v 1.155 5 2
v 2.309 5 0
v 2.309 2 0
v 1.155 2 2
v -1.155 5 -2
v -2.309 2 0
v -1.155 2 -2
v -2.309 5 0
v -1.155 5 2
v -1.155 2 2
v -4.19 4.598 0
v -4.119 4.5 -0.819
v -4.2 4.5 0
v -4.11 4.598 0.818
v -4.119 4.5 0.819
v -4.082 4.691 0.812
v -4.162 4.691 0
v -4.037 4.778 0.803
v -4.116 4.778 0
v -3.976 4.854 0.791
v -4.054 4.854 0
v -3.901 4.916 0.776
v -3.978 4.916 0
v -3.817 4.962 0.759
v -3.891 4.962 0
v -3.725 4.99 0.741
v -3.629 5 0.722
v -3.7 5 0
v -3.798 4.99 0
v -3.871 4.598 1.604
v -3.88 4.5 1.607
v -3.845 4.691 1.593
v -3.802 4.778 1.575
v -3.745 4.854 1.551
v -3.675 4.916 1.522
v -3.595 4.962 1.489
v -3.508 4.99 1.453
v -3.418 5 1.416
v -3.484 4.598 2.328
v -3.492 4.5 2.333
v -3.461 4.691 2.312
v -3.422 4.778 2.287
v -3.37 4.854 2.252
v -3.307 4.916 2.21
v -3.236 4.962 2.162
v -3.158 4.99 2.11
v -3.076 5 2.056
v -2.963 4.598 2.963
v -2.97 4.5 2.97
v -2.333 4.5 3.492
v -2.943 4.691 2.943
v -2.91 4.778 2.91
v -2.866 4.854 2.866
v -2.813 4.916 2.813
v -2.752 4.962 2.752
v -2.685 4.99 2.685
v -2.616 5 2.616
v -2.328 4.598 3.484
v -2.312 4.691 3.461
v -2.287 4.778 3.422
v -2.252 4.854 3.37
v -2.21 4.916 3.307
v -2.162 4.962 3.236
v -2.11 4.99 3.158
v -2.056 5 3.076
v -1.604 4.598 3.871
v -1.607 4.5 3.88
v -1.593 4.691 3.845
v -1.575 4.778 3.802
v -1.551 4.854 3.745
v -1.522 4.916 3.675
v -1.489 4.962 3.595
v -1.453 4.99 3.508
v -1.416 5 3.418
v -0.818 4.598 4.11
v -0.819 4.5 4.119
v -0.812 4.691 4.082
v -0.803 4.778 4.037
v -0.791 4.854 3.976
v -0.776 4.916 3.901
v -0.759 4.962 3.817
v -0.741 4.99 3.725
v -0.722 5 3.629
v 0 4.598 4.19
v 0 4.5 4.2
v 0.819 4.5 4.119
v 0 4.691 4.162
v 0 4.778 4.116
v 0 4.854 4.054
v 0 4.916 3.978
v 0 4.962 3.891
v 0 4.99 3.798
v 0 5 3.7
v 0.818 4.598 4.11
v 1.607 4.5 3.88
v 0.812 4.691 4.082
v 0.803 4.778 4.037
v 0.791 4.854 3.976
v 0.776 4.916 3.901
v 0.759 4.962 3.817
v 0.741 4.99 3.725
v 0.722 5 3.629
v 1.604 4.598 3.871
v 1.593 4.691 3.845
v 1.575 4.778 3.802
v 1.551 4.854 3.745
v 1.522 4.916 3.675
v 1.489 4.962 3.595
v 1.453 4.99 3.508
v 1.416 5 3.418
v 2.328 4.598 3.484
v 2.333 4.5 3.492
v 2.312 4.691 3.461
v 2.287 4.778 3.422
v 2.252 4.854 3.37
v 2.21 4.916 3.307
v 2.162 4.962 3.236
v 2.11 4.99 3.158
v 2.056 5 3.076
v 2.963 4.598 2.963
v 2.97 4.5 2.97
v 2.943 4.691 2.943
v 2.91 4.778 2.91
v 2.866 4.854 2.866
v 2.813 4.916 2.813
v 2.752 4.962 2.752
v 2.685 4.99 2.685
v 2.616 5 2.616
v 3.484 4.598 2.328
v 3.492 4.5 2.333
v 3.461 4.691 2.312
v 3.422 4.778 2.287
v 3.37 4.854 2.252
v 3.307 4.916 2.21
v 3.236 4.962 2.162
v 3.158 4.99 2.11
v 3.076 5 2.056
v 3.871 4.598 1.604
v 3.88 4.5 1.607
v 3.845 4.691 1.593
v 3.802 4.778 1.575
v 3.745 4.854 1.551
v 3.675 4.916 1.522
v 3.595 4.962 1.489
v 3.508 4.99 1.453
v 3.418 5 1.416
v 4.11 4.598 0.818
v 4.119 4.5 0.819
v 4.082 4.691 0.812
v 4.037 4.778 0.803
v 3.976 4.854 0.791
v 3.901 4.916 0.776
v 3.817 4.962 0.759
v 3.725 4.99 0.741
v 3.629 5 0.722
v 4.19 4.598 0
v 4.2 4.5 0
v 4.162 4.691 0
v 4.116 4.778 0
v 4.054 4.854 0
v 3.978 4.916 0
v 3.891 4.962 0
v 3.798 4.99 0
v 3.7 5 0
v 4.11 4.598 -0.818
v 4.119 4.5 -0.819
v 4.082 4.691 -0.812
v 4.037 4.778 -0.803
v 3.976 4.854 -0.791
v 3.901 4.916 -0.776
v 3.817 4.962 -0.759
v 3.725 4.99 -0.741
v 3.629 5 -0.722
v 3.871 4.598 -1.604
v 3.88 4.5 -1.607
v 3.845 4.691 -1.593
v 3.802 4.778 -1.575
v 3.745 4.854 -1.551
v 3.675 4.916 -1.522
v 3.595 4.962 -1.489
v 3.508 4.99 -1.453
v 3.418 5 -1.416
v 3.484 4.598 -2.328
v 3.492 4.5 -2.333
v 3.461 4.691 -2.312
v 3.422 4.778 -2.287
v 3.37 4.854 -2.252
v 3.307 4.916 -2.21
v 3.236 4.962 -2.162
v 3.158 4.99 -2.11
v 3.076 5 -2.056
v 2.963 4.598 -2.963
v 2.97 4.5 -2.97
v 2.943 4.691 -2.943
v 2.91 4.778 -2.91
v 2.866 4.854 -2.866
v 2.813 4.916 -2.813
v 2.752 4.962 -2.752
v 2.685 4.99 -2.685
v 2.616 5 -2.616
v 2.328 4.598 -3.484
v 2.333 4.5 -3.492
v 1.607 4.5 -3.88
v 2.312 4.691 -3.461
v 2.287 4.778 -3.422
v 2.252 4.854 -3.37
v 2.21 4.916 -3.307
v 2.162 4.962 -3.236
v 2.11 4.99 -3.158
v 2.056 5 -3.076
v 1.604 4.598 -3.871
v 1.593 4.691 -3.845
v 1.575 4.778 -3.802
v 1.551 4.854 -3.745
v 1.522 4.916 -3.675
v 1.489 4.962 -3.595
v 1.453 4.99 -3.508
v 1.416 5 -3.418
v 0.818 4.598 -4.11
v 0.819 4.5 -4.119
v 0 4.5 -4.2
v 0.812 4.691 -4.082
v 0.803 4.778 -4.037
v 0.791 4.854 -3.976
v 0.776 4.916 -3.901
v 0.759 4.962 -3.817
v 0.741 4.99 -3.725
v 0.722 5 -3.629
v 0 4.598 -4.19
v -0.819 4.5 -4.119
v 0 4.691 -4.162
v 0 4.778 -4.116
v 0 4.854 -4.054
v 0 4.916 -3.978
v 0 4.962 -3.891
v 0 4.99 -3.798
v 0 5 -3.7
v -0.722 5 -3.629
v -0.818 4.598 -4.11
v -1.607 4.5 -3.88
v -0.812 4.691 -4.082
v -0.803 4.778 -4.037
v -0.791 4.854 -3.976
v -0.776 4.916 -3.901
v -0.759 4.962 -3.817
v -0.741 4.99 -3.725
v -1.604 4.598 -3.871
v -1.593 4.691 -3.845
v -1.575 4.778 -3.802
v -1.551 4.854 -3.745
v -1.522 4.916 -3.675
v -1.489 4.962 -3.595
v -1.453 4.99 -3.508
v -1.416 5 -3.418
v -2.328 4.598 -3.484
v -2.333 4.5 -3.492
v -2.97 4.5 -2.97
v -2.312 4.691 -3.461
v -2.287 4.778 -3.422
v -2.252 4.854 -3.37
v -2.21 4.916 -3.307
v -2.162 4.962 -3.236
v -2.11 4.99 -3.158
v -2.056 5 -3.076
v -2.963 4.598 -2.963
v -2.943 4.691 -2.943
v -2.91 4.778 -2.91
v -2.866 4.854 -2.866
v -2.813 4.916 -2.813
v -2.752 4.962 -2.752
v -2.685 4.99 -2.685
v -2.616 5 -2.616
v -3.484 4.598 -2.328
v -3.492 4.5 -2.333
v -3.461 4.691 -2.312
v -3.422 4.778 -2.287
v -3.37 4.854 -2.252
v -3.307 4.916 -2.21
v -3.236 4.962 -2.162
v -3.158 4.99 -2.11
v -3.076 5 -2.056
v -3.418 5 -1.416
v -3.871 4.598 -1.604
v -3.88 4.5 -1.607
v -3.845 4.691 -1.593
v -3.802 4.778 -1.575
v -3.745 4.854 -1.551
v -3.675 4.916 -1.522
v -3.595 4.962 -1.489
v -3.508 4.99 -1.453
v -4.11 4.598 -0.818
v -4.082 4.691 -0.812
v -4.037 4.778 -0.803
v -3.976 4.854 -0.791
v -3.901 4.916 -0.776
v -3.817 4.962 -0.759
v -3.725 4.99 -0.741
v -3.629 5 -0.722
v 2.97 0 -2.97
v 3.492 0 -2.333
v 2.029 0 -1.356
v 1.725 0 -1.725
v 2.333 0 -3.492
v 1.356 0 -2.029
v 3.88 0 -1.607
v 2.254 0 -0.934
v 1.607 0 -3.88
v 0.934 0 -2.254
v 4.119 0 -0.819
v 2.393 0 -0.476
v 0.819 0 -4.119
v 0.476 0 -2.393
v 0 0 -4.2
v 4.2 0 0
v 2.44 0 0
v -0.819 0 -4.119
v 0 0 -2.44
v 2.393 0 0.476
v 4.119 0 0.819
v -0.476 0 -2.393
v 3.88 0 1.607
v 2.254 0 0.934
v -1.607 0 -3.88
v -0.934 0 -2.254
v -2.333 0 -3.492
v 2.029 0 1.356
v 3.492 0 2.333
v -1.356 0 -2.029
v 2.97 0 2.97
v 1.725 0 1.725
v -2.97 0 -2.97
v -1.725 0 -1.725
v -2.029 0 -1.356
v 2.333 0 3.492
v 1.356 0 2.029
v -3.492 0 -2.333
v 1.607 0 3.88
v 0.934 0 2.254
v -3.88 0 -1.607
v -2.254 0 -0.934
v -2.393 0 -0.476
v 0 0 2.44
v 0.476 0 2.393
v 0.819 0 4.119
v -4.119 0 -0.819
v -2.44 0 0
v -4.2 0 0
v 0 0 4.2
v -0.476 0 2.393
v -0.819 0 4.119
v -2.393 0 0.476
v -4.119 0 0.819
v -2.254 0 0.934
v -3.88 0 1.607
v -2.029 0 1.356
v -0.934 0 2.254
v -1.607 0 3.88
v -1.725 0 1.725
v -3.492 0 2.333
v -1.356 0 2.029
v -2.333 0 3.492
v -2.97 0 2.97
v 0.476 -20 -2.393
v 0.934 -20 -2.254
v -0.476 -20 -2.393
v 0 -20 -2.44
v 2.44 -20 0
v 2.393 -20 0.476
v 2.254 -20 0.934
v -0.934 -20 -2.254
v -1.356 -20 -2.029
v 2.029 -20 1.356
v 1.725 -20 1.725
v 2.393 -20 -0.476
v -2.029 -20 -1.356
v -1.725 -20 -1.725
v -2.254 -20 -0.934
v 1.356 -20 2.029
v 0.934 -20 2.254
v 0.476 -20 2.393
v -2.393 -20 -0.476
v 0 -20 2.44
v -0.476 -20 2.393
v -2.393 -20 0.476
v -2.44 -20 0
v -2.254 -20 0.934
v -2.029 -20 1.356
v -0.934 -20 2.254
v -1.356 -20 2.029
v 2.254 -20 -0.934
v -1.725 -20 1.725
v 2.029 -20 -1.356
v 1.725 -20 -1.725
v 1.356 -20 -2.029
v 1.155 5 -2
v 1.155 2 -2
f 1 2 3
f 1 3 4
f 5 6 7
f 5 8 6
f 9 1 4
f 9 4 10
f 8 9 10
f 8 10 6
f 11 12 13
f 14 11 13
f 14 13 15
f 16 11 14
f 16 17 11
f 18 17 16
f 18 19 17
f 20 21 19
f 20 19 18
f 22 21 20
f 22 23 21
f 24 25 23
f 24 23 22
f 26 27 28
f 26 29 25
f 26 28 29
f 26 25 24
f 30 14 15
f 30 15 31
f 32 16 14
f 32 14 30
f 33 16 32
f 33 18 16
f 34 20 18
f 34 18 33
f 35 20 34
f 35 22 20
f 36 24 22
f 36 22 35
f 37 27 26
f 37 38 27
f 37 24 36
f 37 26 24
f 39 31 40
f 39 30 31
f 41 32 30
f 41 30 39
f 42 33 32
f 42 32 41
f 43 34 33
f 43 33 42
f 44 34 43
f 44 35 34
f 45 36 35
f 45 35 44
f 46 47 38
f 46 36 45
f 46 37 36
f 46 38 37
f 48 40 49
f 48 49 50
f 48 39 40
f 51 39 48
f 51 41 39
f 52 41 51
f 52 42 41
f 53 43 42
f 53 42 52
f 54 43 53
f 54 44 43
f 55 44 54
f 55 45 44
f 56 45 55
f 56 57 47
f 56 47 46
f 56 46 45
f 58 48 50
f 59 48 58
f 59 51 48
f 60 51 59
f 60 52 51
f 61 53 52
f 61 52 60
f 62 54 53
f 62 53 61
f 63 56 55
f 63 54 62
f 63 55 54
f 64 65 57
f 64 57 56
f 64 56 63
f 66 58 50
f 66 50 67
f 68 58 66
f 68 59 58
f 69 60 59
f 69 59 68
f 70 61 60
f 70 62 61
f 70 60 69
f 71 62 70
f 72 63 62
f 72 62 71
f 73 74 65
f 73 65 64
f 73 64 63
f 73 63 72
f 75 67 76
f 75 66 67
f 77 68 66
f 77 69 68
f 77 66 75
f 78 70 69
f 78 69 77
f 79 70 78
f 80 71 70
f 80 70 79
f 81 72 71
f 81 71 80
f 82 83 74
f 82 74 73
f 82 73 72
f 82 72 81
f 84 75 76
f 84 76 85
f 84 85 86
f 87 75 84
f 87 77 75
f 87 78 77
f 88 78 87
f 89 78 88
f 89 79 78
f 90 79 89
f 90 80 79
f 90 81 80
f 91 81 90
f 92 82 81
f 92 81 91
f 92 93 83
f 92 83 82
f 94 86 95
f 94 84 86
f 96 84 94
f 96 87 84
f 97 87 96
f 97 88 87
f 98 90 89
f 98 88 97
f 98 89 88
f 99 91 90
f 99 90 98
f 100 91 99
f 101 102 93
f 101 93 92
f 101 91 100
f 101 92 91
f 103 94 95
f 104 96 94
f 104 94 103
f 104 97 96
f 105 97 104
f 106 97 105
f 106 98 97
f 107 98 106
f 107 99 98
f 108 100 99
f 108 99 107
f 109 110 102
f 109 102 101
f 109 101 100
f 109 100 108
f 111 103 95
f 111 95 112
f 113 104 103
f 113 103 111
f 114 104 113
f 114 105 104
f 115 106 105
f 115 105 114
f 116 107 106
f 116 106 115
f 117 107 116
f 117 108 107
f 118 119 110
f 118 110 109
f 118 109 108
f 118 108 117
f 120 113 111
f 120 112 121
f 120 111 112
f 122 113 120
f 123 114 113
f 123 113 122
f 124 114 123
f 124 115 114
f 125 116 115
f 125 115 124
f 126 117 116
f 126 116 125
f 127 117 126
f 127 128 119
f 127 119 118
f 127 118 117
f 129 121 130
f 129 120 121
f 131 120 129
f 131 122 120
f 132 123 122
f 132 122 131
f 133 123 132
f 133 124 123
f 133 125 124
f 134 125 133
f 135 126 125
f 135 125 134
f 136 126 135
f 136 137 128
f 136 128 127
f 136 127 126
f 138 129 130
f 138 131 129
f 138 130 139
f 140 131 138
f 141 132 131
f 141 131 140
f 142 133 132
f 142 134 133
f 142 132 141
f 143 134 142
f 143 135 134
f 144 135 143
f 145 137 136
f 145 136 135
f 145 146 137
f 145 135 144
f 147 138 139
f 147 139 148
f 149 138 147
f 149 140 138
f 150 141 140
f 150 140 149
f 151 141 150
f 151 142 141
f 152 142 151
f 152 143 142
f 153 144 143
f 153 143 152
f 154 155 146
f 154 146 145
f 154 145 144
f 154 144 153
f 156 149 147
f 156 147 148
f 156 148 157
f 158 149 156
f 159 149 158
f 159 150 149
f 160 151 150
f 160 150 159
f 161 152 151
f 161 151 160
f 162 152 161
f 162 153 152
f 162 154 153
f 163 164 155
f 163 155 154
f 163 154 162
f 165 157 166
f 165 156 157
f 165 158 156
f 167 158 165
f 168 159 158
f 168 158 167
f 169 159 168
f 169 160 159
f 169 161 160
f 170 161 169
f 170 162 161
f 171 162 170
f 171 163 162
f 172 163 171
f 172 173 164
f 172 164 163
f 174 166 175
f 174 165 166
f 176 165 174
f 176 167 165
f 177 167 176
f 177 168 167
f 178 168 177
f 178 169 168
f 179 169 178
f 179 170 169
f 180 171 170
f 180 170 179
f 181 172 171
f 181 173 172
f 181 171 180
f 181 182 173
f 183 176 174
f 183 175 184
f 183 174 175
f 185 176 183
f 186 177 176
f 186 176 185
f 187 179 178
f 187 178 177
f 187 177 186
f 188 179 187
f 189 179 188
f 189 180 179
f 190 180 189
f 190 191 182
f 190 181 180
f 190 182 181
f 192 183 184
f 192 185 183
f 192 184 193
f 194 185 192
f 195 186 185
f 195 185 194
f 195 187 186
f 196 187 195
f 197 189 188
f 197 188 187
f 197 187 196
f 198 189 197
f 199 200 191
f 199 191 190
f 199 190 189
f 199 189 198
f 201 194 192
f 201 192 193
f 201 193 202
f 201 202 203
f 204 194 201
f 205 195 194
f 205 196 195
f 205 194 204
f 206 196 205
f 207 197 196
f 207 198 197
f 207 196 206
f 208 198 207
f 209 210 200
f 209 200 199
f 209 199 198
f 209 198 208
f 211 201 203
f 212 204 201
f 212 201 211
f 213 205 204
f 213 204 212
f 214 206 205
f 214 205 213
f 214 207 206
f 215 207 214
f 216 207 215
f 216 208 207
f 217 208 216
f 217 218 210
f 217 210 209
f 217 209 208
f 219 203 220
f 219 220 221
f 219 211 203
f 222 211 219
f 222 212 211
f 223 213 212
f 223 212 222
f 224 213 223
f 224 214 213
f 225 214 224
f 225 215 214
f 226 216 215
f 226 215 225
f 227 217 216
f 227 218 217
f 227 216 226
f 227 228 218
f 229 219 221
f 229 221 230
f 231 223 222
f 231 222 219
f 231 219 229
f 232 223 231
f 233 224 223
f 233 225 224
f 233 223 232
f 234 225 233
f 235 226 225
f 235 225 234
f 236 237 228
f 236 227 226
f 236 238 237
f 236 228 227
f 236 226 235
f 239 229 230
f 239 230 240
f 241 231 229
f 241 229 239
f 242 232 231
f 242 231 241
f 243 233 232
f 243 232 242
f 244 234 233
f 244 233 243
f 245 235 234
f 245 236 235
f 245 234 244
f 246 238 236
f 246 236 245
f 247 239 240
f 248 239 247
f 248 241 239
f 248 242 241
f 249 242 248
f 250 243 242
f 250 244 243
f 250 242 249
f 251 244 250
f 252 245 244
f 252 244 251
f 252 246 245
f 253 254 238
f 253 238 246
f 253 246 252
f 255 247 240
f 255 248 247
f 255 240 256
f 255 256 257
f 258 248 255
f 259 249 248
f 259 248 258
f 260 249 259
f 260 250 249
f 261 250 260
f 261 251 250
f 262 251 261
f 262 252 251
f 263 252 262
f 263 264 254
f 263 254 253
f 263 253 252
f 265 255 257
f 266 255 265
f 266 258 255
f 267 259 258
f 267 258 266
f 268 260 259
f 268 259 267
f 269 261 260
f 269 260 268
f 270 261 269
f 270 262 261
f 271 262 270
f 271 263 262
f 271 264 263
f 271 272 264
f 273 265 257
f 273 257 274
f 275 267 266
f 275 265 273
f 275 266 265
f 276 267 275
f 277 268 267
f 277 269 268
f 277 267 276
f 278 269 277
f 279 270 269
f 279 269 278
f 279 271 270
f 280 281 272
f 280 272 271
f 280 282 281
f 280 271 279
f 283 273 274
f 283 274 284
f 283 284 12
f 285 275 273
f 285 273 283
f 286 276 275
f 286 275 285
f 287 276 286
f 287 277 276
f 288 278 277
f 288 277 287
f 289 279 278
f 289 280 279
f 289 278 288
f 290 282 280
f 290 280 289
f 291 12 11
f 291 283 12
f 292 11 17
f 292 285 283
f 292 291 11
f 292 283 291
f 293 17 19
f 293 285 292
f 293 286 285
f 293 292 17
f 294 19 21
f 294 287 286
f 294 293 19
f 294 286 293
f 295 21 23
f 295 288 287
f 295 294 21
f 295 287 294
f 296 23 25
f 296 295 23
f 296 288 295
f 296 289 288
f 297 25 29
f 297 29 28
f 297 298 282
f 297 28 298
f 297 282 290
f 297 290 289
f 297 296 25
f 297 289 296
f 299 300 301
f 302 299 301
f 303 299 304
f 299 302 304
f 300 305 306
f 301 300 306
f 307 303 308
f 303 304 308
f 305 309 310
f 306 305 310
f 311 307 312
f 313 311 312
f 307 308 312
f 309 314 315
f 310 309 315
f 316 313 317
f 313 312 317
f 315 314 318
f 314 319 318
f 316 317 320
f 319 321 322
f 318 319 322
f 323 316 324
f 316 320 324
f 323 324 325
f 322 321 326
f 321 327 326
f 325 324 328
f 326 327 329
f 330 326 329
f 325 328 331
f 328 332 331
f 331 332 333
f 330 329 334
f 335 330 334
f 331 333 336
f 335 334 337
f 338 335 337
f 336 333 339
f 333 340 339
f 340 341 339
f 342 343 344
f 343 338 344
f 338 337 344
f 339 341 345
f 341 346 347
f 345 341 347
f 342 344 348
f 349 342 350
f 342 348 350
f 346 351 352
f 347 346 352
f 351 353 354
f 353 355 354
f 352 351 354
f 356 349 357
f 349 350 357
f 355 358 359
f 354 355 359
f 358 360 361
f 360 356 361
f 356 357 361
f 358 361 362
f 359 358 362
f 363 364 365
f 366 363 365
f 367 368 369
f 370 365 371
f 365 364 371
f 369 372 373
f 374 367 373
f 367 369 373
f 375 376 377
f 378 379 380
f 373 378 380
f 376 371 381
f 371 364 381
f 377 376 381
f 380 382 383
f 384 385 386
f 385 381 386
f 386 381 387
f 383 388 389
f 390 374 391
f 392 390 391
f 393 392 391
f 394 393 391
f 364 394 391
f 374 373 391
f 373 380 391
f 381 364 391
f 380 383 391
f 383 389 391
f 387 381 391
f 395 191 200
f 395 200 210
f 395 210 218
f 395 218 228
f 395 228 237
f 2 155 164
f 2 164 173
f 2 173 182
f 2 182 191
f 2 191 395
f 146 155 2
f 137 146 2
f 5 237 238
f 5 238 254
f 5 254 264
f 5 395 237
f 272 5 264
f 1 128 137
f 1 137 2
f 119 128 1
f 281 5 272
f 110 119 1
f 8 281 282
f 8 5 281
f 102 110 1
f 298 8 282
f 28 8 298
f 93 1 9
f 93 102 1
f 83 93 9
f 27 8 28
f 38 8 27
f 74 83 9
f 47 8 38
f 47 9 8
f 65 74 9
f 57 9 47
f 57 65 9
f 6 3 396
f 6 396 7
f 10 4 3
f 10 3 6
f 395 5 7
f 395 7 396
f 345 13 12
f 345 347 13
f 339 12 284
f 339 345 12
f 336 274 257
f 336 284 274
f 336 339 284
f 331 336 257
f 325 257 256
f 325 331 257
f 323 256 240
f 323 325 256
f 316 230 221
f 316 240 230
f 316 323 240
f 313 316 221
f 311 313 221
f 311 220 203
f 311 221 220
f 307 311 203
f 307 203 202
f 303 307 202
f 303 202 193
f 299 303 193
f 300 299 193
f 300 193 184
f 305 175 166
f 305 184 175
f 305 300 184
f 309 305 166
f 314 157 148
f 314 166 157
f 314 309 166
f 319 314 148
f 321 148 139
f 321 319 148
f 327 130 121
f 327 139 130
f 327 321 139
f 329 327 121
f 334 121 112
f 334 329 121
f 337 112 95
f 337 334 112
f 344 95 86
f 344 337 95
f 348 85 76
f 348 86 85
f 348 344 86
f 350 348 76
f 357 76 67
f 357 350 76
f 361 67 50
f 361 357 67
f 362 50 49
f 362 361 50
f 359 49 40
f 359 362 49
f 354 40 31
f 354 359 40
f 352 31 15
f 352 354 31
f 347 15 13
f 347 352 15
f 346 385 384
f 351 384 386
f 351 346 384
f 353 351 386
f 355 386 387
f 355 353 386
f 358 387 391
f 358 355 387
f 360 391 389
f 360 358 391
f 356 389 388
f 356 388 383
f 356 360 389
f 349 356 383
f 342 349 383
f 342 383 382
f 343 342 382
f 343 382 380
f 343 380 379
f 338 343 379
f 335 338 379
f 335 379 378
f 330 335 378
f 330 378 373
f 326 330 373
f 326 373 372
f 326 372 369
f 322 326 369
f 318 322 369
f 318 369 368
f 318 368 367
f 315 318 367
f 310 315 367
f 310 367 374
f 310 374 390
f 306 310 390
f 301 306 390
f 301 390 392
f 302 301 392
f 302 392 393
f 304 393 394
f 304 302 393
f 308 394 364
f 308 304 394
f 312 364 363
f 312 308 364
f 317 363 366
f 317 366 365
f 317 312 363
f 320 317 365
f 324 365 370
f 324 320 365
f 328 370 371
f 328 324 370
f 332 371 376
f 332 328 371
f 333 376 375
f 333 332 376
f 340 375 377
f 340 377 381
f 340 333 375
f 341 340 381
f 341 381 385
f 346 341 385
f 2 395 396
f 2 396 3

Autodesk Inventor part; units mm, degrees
ref_plane "YZ Plane" through (0, 0, 0) normal (1, 0, 0) x (0, 1, 0)
ref_plane "XZ Plane" through (0, 0, 0) normal (0, 1, 0) x (-1, 0, 0)
ref_plane "XY Plane" through (0, 0, 0) normal (0, 0, 1) x (1, 0, 0)
sketch "Sketch1" plane through (0, 0, 0) normal (0, 1, 0) x (-1, 0, 0)
  circle A0 centre (0, 0) radius 2.44
  circle A1 centre (0, 0) radius 4.2
  line L0 (1.1547, -2) -> (-1.1547, -2)
  line L1 (-1.1547, -2) -> (-2.3094, 0)
  line L2 (-2.3094, 0) -> (-1.1547, 2)
  line L3 (-1.1547, 2) -> (1.1547, 2)
  line L4 (1.1547, 2) -> (2.3094, 0)
  line L5 (2.3094, 0) -> (1.1547, -2)
  dimension "d0" = 4.88
  dimension "d1" = 8.4
  dimension "d8" = 4
extrude "Extrusion1" add sketch "Sketch1" along normal blind 5 contours A0 | A1 | L0 L1 L2 L3 L4 L5
extrude "Extrusion2" add sketch "Sketch1" against normal blind 20 contours A0 | L0 L1 L2 L3 L4 L5
extrude "Extrusion3" cut sketch "Sketch1" against normal blind 3 from surface at 5 contours L0 L1 L2 L3 L4 L5
fillet "Fillet1" radius 0.5 1 edges at (4.2, 5, 0)
thread "Thread2" size "M5x0.8" class "6g" standard "ANSI Metric M Profile" full length
equation "\"d4\" = length"
equation "\"length\" = 20"
properties part number "M5x20"
